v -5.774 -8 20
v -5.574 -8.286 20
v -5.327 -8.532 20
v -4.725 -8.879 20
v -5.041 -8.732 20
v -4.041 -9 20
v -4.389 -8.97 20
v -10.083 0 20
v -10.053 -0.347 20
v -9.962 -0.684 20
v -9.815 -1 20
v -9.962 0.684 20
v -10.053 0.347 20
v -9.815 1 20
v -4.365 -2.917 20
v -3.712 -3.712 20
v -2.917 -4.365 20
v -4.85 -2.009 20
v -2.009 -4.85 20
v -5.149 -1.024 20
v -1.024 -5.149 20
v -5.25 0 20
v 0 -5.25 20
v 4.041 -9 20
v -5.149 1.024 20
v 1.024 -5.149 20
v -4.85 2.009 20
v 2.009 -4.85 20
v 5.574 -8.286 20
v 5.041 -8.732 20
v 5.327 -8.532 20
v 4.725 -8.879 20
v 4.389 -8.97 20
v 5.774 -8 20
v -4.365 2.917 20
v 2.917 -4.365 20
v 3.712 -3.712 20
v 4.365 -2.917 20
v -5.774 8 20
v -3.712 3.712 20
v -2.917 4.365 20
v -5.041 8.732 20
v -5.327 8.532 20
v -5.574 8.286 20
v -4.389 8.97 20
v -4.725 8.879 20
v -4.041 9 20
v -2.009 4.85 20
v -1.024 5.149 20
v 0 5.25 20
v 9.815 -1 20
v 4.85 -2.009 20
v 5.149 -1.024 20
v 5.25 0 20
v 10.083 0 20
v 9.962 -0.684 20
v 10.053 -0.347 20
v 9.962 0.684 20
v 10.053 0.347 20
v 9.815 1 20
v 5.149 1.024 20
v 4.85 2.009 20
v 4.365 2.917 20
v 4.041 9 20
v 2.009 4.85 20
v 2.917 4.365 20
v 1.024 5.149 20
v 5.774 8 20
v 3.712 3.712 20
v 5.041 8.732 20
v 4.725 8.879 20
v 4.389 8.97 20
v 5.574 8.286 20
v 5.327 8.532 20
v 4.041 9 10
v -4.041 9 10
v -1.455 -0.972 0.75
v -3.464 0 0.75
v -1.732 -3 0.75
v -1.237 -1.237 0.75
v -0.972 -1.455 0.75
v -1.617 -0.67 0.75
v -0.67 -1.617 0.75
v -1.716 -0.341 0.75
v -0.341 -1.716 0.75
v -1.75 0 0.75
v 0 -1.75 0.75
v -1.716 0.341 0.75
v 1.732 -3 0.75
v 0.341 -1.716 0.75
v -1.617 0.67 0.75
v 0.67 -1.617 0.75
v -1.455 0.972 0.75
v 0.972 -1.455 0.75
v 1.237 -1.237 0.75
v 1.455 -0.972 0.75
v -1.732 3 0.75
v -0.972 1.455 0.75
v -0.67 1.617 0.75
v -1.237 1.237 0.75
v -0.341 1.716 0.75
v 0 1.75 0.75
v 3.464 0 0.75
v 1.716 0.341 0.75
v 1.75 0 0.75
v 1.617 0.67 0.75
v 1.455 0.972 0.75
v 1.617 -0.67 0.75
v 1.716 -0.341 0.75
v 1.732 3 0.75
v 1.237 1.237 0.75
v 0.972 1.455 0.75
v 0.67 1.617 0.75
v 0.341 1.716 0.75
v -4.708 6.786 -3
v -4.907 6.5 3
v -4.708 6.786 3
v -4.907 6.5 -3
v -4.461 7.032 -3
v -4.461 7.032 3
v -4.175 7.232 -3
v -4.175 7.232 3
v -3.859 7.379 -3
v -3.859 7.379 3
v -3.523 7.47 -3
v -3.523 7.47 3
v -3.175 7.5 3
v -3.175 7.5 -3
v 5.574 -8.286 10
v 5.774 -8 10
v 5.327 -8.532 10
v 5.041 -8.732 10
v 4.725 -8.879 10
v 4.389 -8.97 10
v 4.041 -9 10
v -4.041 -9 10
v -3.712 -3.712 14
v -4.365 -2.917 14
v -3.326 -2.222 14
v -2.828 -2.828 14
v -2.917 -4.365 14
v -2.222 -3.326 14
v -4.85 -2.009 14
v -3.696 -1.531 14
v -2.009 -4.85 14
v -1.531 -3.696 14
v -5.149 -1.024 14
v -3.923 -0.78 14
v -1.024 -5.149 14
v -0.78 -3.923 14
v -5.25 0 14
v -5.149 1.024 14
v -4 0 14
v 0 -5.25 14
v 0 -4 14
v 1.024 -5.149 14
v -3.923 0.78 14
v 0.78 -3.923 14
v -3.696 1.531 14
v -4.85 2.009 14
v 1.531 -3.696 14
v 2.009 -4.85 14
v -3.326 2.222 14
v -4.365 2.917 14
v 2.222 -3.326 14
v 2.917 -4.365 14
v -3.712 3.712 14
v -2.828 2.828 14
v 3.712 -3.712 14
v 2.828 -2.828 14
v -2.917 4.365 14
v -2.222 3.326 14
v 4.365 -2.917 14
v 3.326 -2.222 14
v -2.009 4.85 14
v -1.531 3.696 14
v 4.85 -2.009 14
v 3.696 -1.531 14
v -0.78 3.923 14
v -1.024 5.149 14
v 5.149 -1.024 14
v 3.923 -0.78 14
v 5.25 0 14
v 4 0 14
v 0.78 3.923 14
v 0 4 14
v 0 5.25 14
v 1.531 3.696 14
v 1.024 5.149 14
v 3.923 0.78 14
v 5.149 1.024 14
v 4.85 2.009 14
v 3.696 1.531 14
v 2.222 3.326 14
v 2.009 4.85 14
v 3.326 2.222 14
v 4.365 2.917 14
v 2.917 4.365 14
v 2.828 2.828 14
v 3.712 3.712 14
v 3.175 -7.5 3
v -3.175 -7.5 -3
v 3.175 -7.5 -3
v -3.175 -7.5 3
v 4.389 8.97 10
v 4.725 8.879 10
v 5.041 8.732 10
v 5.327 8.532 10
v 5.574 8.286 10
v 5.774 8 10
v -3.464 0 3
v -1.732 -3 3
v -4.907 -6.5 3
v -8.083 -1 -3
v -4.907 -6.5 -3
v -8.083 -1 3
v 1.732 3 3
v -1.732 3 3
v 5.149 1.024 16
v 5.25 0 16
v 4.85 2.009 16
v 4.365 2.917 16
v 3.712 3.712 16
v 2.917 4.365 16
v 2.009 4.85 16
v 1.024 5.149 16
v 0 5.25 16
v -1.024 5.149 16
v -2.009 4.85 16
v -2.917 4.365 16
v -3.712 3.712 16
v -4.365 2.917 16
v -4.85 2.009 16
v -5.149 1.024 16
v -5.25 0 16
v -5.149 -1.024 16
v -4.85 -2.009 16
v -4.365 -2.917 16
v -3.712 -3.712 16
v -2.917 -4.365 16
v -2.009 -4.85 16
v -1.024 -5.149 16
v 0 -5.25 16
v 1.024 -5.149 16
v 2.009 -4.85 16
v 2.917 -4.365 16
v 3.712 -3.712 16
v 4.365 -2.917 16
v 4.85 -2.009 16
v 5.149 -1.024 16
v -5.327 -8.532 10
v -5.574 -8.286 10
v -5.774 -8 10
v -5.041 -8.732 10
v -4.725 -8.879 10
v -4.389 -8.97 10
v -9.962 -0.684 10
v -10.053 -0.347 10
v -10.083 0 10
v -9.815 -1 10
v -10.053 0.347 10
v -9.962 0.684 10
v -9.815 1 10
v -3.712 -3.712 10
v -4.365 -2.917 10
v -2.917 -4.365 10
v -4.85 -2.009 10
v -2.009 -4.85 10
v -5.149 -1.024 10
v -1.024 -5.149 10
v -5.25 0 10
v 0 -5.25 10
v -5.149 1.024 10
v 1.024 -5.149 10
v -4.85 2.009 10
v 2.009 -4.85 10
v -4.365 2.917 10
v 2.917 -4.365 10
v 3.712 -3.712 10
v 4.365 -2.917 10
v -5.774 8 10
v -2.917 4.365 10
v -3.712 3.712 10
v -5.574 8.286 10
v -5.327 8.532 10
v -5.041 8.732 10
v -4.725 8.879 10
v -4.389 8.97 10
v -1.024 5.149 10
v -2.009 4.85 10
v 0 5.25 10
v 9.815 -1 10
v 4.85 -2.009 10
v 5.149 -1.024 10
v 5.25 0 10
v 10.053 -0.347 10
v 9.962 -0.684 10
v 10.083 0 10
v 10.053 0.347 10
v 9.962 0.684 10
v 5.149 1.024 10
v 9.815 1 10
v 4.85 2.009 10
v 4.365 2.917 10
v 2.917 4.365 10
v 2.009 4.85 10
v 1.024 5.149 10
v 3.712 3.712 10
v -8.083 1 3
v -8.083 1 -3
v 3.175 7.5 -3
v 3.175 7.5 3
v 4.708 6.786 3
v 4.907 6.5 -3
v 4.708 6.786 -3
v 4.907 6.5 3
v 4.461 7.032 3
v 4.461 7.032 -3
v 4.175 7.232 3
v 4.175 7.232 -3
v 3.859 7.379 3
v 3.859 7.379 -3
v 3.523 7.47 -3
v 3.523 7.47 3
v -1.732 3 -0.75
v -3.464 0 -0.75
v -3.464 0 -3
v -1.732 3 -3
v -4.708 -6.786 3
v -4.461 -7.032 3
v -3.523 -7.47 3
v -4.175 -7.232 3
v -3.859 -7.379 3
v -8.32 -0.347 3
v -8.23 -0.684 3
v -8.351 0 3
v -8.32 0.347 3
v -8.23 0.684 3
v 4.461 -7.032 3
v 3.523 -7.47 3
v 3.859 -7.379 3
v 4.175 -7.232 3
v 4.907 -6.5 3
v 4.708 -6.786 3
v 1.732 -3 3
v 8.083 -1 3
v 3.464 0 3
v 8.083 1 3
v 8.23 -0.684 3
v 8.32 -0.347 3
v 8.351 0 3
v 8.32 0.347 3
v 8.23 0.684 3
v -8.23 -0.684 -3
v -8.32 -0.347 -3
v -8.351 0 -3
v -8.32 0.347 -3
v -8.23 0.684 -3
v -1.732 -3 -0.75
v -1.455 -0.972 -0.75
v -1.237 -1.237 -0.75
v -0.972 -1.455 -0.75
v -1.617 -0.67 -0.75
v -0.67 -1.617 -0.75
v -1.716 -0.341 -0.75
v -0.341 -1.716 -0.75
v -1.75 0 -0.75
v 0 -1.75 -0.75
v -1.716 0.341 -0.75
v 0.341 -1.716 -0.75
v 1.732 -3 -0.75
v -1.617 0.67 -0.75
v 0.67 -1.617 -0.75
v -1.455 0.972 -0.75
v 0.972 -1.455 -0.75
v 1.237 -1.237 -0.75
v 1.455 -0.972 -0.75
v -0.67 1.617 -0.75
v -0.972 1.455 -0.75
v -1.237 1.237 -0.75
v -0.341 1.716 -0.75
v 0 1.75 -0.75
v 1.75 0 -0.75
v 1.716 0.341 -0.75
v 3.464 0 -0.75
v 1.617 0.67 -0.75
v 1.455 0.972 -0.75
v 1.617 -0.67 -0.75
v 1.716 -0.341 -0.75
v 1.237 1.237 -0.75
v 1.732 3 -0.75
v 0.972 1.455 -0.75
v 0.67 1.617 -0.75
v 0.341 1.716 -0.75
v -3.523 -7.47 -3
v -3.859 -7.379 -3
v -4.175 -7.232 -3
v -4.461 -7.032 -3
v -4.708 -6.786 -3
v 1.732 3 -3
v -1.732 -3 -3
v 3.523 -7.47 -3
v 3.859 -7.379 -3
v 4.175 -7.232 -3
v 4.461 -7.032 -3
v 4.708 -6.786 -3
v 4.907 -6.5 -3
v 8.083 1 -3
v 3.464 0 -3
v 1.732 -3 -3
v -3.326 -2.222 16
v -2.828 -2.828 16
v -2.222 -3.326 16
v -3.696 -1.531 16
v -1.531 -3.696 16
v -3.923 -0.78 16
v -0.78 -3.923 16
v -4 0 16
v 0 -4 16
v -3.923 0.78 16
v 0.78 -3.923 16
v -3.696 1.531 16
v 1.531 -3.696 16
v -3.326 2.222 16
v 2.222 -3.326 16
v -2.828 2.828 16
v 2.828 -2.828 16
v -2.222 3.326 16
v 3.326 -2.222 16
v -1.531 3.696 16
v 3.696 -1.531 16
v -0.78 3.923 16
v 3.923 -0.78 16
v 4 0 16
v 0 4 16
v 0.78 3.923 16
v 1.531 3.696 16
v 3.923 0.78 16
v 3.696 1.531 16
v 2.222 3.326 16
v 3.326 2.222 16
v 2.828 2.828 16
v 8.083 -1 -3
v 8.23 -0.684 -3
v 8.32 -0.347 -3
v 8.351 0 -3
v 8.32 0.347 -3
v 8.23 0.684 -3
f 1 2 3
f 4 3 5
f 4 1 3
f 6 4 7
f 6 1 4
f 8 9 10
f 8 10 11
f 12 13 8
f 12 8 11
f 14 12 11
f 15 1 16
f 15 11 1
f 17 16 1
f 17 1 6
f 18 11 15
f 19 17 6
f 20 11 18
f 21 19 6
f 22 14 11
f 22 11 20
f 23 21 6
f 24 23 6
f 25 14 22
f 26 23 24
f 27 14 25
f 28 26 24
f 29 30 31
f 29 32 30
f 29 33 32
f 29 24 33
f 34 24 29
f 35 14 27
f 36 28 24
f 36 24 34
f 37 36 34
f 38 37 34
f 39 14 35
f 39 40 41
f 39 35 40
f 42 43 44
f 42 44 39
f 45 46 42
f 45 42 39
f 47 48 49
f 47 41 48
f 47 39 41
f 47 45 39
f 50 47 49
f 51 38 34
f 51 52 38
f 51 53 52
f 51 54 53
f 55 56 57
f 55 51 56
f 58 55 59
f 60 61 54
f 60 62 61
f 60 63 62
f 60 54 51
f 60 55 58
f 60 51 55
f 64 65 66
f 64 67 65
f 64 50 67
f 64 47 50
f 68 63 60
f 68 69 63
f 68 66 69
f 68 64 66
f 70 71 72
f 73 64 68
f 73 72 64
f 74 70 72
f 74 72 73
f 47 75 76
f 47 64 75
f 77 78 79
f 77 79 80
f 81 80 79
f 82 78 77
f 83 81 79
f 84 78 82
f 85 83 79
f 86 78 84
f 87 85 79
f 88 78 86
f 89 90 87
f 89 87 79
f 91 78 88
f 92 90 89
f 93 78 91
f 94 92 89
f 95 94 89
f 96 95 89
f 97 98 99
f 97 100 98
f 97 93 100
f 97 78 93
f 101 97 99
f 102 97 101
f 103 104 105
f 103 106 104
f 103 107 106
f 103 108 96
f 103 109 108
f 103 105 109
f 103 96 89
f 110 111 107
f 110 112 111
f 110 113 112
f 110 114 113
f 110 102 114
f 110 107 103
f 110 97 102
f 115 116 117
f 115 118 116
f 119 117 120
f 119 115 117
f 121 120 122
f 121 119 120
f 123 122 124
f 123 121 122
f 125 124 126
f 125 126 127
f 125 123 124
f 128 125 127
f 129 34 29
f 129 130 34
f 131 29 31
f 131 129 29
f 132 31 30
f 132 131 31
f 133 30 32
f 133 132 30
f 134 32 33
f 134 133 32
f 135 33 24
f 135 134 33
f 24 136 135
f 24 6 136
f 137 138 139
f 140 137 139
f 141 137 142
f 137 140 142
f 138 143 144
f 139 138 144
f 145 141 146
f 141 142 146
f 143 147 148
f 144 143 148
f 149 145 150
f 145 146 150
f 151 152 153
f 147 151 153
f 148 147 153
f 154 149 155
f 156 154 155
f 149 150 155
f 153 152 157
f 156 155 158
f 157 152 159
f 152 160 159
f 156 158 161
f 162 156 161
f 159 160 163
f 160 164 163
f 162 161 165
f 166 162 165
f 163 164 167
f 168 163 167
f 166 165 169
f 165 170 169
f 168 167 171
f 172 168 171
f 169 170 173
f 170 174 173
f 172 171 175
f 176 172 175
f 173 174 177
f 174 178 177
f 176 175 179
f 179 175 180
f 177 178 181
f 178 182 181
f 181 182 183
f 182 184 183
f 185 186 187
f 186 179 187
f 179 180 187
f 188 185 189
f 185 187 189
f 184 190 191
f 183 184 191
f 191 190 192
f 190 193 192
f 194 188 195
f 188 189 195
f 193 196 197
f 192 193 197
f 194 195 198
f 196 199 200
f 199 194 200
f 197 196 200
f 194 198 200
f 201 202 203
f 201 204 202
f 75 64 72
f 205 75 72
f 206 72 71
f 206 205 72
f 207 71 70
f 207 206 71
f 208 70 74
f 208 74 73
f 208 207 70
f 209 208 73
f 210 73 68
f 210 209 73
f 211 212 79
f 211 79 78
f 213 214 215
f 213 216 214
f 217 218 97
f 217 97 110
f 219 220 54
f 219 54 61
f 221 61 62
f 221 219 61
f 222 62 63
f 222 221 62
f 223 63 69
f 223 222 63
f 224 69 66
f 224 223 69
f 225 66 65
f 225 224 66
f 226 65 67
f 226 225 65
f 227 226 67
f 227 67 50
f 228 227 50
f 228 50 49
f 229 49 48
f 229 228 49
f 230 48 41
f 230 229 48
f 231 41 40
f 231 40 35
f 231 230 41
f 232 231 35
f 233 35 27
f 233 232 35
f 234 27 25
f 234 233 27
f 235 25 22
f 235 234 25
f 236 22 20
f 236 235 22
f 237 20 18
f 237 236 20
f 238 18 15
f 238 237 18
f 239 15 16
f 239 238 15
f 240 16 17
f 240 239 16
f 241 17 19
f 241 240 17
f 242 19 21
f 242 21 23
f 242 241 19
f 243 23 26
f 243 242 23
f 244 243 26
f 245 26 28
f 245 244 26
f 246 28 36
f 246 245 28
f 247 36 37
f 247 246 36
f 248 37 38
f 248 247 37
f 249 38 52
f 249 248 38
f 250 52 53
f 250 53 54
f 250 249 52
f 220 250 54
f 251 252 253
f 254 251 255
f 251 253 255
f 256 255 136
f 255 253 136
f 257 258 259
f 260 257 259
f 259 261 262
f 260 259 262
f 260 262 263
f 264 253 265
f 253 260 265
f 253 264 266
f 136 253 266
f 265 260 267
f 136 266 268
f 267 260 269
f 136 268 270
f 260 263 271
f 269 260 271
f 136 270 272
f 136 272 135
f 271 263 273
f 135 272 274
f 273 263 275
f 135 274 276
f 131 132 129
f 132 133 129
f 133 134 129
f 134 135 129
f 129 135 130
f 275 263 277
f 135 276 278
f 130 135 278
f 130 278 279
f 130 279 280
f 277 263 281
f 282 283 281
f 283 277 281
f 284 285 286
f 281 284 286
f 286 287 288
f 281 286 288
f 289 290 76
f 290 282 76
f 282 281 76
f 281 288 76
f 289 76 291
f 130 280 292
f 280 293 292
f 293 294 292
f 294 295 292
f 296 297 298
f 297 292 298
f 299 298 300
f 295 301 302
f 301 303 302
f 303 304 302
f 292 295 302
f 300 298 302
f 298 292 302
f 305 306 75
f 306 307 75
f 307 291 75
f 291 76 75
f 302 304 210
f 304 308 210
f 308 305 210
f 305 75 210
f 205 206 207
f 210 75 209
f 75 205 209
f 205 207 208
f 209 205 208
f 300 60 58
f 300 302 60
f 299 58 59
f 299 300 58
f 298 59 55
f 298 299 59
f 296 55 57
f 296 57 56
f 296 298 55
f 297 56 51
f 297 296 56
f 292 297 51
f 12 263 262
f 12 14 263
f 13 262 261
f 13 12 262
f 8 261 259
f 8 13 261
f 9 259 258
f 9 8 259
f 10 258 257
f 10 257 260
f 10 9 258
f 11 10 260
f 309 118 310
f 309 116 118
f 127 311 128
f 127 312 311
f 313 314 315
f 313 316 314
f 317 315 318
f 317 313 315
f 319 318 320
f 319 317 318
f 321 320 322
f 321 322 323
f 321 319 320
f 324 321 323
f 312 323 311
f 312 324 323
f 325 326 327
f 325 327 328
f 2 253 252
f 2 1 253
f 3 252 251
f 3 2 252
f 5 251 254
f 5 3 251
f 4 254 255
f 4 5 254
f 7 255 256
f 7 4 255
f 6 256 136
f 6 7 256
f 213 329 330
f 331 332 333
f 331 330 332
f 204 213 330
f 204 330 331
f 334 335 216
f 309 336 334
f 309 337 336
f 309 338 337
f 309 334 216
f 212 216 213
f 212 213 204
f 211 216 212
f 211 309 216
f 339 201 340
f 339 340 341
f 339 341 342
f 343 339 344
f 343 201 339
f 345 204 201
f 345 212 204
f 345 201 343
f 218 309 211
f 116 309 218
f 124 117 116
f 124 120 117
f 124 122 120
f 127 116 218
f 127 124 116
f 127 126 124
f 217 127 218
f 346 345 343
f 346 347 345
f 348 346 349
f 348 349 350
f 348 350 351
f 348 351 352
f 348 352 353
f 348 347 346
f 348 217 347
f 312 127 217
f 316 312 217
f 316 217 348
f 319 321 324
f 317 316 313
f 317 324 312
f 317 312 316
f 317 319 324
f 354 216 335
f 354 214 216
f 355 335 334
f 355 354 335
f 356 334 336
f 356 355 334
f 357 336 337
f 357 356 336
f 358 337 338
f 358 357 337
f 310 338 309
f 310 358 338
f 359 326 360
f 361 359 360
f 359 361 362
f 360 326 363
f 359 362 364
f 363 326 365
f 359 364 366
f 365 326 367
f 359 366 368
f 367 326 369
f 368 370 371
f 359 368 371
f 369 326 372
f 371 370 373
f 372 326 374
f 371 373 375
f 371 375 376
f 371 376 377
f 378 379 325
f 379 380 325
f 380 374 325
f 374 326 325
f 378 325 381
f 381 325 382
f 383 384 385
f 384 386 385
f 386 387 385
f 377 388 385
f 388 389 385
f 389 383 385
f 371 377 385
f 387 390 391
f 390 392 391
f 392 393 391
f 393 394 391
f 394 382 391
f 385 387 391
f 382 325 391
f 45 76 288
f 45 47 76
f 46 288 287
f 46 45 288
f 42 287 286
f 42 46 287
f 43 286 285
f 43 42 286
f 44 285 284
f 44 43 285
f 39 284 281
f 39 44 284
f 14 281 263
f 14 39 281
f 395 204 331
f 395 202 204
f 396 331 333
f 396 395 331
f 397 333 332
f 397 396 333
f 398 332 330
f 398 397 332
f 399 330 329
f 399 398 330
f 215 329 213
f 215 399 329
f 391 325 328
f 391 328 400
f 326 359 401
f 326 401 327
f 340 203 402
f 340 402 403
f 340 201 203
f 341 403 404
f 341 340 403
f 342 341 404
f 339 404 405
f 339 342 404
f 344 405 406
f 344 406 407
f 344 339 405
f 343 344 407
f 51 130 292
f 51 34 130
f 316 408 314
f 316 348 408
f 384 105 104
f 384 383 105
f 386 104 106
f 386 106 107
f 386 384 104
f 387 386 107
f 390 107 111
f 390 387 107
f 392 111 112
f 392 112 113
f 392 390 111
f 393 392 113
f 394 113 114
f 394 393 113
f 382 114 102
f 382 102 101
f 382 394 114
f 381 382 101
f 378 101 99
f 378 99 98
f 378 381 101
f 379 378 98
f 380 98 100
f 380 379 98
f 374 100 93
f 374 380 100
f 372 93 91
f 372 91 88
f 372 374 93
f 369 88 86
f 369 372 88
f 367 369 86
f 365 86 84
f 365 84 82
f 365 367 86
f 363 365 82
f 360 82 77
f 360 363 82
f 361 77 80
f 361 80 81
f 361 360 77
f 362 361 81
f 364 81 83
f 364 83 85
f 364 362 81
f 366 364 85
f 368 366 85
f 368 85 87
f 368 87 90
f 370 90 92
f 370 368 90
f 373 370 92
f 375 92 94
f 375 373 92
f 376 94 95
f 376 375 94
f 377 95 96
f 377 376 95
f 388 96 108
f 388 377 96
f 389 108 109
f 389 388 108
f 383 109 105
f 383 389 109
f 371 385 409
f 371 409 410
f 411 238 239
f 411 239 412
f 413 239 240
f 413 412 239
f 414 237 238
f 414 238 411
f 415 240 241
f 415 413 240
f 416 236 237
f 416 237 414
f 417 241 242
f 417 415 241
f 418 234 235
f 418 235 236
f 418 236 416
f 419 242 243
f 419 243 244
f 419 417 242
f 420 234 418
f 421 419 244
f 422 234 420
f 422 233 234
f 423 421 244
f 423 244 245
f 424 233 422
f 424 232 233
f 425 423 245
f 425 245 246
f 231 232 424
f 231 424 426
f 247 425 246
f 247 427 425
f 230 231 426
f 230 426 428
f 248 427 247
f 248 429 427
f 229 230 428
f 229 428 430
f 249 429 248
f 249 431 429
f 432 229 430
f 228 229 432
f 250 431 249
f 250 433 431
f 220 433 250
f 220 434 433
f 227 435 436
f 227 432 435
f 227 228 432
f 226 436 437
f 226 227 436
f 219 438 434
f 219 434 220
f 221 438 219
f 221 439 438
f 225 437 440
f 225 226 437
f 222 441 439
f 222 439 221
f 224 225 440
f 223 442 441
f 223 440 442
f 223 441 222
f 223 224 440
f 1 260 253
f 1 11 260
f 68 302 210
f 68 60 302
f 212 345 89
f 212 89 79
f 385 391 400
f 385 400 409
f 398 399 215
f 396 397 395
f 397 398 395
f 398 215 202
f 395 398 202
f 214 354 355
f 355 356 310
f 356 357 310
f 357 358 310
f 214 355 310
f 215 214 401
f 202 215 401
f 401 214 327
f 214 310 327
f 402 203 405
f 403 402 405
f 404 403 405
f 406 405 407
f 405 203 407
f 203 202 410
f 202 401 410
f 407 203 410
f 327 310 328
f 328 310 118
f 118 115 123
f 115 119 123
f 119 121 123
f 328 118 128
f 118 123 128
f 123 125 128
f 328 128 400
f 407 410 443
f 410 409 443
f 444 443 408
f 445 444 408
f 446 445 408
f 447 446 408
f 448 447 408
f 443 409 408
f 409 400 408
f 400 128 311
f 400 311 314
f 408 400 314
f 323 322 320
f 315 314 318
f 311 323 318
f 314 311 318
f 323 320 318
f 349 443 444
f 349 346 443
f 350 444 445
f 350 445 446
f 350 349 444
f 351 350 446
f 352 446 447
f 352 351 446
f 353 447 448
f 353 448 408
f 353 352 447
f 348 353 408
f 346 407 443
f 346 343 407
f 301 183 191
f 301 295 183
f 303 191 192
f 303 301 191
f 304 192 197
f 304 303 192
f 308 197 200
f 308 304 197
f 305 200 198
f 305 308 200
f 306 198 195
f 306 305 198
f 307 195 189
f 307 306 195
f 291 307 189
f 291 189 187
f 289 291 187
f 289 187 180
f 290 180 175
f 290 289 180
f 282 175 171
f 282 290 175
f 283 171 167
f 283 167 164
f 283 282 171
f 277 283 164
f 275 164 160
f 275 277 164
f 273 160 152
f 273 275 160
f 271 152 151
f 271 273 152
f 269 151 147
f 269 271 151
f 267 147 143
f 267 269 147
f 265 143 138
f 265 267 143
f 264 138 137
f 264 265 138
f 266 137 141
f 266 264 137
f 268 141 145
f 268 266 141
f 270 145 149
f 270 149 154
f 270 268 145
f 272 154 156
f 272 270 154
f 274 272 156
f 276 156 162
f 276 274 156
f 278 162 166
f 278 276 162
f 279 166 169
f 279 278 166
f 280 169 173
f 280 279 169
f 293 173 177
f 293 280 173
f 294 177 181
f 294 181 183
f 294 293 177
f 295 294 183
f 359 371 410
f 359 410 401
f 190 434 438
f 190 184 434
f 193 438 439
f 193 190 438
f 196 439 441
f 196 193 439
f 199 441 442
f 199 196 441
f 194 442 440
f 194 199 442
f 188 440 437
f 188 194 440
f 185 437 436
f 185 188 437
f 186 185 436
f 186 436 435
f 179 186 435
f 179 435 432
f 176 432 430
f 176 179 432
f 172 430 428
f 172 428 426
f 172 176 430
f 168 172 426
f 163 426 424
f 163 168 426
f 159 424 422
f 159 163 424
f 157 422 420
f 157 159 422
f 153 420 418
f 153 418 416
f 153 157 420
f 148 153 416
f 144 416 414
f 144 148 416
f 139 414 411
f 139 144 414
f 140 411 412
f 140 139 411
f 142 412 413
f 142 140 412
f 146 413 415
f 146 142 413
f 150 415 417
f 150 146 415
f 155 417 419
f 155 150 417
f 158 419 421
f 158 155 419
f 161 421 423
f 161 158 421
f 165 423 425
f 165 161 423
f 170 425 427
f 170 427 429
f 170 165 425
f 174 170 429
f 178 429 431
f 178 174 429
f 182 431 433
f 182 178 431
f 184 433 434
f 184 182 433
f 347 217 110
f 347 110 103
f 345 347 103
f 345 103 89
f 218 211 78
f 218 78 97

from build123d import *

# Parameters (mm, degrees)
F0_R     = 5.25
F1_DEPTH = 5
F0_R_2   = 4
F2_DEPTH = 1
F5_DEPTH = 3
F4_R     = 1.75
F6_DEPTH = 0.75
F7_R     = 2
F7_2_R   = 2


with BuildPart() as f1:
    # F0 (on Top) → F1 (new body, symmetric)
    with BuildSketch(Plane.XY):
        Polygon((5.1961524227, 9), (-5.1961524227, 9), (-10.3923048454, 0), (-5.1961524227, -9), (5.1961524227, -9), (10.3923048454, 0), align=None)
        Circle(F0_R, mode=Mode.SUBTRACT)
    extrude(amount=F1_DEPTH, both=True)

    # F0 (on Top) → F2 (join, symmetric)
    with BuildSketch(Plane.XY):
        Circle(F0_R)
        Circle(F0_R_2, mode=Mode.SUBTRACT)
    extrude(amount=F2_DEPTH, both=True)


with BuildPart() as f1_1:
    # F3: moved
    add(f1.part.moved(Location((0, 0, 15))))

    # F7
    f7_edges = [f1_1.edges().sort_by_distance(p)[0] for p in [
        (-5.196152, 9, 15),
        (5.196152, 9, 15),
        (-5.196152, -9, 15),
        (5.196152, -9, 15),
        (10.392305, 0, 15),
        (-10.392305, 0, 15),
    ]]
    fillet(f7_edges, radius=F7_R)


with BuildPart() as f5:
    # F4 (on Top) → F5 (new body, symmetric)
    with BuildSketch(Plane.XY):
        Polygon((-4.3301270189, -7.5), (4.3301270189, -7.5), (8.6602540378, 0), (4.3301270189, 7.5), (-4.3301270189, 7.5), (-8.6602540378, 0), align=None)
        Polygon((3.4641016151, 0), (1.7320508076, -3), (-1.7320508076, -3), (-3.4641016151, 0), (-1.7320508076, 3), (1.7320508076, 3), align=None, mode=Mode.SUBTRACT)
    extrude(amount=F5_DEPTH, both=True)

    # F4 (on Top) → F6 (join, symmetric)
    with BuildSketch(Plane.XY):
        Polygon((-1.7320508076, -3), (1.7320508076, -3), (3.4641016151, 0), (1.7320508076, 3), (-1.7320508076, 3), (-3.4641016151, 0), align=None)
        Circle(F4_R, mode=Mode.SUBTRACT)
    extrude(amount=F6_DEPTH, both=True)

    # F7#2
    f7_2_edges = [f5.edges().sort_by_distance(p)[0] for p in [
        (-4.330127, 7.5, 0),
        (4.330127, 7.5, 0),
        (-8.660254, 0, 0),
        (-4.330127, -7.5, 0),
        (4.330127, -7.5, 0),
        (8.660254, 0, 0),
    ]]
    fillet(f7_2_edges, radius=F7_2_R)


solid = Compound([f1_1.part, f5.part])
